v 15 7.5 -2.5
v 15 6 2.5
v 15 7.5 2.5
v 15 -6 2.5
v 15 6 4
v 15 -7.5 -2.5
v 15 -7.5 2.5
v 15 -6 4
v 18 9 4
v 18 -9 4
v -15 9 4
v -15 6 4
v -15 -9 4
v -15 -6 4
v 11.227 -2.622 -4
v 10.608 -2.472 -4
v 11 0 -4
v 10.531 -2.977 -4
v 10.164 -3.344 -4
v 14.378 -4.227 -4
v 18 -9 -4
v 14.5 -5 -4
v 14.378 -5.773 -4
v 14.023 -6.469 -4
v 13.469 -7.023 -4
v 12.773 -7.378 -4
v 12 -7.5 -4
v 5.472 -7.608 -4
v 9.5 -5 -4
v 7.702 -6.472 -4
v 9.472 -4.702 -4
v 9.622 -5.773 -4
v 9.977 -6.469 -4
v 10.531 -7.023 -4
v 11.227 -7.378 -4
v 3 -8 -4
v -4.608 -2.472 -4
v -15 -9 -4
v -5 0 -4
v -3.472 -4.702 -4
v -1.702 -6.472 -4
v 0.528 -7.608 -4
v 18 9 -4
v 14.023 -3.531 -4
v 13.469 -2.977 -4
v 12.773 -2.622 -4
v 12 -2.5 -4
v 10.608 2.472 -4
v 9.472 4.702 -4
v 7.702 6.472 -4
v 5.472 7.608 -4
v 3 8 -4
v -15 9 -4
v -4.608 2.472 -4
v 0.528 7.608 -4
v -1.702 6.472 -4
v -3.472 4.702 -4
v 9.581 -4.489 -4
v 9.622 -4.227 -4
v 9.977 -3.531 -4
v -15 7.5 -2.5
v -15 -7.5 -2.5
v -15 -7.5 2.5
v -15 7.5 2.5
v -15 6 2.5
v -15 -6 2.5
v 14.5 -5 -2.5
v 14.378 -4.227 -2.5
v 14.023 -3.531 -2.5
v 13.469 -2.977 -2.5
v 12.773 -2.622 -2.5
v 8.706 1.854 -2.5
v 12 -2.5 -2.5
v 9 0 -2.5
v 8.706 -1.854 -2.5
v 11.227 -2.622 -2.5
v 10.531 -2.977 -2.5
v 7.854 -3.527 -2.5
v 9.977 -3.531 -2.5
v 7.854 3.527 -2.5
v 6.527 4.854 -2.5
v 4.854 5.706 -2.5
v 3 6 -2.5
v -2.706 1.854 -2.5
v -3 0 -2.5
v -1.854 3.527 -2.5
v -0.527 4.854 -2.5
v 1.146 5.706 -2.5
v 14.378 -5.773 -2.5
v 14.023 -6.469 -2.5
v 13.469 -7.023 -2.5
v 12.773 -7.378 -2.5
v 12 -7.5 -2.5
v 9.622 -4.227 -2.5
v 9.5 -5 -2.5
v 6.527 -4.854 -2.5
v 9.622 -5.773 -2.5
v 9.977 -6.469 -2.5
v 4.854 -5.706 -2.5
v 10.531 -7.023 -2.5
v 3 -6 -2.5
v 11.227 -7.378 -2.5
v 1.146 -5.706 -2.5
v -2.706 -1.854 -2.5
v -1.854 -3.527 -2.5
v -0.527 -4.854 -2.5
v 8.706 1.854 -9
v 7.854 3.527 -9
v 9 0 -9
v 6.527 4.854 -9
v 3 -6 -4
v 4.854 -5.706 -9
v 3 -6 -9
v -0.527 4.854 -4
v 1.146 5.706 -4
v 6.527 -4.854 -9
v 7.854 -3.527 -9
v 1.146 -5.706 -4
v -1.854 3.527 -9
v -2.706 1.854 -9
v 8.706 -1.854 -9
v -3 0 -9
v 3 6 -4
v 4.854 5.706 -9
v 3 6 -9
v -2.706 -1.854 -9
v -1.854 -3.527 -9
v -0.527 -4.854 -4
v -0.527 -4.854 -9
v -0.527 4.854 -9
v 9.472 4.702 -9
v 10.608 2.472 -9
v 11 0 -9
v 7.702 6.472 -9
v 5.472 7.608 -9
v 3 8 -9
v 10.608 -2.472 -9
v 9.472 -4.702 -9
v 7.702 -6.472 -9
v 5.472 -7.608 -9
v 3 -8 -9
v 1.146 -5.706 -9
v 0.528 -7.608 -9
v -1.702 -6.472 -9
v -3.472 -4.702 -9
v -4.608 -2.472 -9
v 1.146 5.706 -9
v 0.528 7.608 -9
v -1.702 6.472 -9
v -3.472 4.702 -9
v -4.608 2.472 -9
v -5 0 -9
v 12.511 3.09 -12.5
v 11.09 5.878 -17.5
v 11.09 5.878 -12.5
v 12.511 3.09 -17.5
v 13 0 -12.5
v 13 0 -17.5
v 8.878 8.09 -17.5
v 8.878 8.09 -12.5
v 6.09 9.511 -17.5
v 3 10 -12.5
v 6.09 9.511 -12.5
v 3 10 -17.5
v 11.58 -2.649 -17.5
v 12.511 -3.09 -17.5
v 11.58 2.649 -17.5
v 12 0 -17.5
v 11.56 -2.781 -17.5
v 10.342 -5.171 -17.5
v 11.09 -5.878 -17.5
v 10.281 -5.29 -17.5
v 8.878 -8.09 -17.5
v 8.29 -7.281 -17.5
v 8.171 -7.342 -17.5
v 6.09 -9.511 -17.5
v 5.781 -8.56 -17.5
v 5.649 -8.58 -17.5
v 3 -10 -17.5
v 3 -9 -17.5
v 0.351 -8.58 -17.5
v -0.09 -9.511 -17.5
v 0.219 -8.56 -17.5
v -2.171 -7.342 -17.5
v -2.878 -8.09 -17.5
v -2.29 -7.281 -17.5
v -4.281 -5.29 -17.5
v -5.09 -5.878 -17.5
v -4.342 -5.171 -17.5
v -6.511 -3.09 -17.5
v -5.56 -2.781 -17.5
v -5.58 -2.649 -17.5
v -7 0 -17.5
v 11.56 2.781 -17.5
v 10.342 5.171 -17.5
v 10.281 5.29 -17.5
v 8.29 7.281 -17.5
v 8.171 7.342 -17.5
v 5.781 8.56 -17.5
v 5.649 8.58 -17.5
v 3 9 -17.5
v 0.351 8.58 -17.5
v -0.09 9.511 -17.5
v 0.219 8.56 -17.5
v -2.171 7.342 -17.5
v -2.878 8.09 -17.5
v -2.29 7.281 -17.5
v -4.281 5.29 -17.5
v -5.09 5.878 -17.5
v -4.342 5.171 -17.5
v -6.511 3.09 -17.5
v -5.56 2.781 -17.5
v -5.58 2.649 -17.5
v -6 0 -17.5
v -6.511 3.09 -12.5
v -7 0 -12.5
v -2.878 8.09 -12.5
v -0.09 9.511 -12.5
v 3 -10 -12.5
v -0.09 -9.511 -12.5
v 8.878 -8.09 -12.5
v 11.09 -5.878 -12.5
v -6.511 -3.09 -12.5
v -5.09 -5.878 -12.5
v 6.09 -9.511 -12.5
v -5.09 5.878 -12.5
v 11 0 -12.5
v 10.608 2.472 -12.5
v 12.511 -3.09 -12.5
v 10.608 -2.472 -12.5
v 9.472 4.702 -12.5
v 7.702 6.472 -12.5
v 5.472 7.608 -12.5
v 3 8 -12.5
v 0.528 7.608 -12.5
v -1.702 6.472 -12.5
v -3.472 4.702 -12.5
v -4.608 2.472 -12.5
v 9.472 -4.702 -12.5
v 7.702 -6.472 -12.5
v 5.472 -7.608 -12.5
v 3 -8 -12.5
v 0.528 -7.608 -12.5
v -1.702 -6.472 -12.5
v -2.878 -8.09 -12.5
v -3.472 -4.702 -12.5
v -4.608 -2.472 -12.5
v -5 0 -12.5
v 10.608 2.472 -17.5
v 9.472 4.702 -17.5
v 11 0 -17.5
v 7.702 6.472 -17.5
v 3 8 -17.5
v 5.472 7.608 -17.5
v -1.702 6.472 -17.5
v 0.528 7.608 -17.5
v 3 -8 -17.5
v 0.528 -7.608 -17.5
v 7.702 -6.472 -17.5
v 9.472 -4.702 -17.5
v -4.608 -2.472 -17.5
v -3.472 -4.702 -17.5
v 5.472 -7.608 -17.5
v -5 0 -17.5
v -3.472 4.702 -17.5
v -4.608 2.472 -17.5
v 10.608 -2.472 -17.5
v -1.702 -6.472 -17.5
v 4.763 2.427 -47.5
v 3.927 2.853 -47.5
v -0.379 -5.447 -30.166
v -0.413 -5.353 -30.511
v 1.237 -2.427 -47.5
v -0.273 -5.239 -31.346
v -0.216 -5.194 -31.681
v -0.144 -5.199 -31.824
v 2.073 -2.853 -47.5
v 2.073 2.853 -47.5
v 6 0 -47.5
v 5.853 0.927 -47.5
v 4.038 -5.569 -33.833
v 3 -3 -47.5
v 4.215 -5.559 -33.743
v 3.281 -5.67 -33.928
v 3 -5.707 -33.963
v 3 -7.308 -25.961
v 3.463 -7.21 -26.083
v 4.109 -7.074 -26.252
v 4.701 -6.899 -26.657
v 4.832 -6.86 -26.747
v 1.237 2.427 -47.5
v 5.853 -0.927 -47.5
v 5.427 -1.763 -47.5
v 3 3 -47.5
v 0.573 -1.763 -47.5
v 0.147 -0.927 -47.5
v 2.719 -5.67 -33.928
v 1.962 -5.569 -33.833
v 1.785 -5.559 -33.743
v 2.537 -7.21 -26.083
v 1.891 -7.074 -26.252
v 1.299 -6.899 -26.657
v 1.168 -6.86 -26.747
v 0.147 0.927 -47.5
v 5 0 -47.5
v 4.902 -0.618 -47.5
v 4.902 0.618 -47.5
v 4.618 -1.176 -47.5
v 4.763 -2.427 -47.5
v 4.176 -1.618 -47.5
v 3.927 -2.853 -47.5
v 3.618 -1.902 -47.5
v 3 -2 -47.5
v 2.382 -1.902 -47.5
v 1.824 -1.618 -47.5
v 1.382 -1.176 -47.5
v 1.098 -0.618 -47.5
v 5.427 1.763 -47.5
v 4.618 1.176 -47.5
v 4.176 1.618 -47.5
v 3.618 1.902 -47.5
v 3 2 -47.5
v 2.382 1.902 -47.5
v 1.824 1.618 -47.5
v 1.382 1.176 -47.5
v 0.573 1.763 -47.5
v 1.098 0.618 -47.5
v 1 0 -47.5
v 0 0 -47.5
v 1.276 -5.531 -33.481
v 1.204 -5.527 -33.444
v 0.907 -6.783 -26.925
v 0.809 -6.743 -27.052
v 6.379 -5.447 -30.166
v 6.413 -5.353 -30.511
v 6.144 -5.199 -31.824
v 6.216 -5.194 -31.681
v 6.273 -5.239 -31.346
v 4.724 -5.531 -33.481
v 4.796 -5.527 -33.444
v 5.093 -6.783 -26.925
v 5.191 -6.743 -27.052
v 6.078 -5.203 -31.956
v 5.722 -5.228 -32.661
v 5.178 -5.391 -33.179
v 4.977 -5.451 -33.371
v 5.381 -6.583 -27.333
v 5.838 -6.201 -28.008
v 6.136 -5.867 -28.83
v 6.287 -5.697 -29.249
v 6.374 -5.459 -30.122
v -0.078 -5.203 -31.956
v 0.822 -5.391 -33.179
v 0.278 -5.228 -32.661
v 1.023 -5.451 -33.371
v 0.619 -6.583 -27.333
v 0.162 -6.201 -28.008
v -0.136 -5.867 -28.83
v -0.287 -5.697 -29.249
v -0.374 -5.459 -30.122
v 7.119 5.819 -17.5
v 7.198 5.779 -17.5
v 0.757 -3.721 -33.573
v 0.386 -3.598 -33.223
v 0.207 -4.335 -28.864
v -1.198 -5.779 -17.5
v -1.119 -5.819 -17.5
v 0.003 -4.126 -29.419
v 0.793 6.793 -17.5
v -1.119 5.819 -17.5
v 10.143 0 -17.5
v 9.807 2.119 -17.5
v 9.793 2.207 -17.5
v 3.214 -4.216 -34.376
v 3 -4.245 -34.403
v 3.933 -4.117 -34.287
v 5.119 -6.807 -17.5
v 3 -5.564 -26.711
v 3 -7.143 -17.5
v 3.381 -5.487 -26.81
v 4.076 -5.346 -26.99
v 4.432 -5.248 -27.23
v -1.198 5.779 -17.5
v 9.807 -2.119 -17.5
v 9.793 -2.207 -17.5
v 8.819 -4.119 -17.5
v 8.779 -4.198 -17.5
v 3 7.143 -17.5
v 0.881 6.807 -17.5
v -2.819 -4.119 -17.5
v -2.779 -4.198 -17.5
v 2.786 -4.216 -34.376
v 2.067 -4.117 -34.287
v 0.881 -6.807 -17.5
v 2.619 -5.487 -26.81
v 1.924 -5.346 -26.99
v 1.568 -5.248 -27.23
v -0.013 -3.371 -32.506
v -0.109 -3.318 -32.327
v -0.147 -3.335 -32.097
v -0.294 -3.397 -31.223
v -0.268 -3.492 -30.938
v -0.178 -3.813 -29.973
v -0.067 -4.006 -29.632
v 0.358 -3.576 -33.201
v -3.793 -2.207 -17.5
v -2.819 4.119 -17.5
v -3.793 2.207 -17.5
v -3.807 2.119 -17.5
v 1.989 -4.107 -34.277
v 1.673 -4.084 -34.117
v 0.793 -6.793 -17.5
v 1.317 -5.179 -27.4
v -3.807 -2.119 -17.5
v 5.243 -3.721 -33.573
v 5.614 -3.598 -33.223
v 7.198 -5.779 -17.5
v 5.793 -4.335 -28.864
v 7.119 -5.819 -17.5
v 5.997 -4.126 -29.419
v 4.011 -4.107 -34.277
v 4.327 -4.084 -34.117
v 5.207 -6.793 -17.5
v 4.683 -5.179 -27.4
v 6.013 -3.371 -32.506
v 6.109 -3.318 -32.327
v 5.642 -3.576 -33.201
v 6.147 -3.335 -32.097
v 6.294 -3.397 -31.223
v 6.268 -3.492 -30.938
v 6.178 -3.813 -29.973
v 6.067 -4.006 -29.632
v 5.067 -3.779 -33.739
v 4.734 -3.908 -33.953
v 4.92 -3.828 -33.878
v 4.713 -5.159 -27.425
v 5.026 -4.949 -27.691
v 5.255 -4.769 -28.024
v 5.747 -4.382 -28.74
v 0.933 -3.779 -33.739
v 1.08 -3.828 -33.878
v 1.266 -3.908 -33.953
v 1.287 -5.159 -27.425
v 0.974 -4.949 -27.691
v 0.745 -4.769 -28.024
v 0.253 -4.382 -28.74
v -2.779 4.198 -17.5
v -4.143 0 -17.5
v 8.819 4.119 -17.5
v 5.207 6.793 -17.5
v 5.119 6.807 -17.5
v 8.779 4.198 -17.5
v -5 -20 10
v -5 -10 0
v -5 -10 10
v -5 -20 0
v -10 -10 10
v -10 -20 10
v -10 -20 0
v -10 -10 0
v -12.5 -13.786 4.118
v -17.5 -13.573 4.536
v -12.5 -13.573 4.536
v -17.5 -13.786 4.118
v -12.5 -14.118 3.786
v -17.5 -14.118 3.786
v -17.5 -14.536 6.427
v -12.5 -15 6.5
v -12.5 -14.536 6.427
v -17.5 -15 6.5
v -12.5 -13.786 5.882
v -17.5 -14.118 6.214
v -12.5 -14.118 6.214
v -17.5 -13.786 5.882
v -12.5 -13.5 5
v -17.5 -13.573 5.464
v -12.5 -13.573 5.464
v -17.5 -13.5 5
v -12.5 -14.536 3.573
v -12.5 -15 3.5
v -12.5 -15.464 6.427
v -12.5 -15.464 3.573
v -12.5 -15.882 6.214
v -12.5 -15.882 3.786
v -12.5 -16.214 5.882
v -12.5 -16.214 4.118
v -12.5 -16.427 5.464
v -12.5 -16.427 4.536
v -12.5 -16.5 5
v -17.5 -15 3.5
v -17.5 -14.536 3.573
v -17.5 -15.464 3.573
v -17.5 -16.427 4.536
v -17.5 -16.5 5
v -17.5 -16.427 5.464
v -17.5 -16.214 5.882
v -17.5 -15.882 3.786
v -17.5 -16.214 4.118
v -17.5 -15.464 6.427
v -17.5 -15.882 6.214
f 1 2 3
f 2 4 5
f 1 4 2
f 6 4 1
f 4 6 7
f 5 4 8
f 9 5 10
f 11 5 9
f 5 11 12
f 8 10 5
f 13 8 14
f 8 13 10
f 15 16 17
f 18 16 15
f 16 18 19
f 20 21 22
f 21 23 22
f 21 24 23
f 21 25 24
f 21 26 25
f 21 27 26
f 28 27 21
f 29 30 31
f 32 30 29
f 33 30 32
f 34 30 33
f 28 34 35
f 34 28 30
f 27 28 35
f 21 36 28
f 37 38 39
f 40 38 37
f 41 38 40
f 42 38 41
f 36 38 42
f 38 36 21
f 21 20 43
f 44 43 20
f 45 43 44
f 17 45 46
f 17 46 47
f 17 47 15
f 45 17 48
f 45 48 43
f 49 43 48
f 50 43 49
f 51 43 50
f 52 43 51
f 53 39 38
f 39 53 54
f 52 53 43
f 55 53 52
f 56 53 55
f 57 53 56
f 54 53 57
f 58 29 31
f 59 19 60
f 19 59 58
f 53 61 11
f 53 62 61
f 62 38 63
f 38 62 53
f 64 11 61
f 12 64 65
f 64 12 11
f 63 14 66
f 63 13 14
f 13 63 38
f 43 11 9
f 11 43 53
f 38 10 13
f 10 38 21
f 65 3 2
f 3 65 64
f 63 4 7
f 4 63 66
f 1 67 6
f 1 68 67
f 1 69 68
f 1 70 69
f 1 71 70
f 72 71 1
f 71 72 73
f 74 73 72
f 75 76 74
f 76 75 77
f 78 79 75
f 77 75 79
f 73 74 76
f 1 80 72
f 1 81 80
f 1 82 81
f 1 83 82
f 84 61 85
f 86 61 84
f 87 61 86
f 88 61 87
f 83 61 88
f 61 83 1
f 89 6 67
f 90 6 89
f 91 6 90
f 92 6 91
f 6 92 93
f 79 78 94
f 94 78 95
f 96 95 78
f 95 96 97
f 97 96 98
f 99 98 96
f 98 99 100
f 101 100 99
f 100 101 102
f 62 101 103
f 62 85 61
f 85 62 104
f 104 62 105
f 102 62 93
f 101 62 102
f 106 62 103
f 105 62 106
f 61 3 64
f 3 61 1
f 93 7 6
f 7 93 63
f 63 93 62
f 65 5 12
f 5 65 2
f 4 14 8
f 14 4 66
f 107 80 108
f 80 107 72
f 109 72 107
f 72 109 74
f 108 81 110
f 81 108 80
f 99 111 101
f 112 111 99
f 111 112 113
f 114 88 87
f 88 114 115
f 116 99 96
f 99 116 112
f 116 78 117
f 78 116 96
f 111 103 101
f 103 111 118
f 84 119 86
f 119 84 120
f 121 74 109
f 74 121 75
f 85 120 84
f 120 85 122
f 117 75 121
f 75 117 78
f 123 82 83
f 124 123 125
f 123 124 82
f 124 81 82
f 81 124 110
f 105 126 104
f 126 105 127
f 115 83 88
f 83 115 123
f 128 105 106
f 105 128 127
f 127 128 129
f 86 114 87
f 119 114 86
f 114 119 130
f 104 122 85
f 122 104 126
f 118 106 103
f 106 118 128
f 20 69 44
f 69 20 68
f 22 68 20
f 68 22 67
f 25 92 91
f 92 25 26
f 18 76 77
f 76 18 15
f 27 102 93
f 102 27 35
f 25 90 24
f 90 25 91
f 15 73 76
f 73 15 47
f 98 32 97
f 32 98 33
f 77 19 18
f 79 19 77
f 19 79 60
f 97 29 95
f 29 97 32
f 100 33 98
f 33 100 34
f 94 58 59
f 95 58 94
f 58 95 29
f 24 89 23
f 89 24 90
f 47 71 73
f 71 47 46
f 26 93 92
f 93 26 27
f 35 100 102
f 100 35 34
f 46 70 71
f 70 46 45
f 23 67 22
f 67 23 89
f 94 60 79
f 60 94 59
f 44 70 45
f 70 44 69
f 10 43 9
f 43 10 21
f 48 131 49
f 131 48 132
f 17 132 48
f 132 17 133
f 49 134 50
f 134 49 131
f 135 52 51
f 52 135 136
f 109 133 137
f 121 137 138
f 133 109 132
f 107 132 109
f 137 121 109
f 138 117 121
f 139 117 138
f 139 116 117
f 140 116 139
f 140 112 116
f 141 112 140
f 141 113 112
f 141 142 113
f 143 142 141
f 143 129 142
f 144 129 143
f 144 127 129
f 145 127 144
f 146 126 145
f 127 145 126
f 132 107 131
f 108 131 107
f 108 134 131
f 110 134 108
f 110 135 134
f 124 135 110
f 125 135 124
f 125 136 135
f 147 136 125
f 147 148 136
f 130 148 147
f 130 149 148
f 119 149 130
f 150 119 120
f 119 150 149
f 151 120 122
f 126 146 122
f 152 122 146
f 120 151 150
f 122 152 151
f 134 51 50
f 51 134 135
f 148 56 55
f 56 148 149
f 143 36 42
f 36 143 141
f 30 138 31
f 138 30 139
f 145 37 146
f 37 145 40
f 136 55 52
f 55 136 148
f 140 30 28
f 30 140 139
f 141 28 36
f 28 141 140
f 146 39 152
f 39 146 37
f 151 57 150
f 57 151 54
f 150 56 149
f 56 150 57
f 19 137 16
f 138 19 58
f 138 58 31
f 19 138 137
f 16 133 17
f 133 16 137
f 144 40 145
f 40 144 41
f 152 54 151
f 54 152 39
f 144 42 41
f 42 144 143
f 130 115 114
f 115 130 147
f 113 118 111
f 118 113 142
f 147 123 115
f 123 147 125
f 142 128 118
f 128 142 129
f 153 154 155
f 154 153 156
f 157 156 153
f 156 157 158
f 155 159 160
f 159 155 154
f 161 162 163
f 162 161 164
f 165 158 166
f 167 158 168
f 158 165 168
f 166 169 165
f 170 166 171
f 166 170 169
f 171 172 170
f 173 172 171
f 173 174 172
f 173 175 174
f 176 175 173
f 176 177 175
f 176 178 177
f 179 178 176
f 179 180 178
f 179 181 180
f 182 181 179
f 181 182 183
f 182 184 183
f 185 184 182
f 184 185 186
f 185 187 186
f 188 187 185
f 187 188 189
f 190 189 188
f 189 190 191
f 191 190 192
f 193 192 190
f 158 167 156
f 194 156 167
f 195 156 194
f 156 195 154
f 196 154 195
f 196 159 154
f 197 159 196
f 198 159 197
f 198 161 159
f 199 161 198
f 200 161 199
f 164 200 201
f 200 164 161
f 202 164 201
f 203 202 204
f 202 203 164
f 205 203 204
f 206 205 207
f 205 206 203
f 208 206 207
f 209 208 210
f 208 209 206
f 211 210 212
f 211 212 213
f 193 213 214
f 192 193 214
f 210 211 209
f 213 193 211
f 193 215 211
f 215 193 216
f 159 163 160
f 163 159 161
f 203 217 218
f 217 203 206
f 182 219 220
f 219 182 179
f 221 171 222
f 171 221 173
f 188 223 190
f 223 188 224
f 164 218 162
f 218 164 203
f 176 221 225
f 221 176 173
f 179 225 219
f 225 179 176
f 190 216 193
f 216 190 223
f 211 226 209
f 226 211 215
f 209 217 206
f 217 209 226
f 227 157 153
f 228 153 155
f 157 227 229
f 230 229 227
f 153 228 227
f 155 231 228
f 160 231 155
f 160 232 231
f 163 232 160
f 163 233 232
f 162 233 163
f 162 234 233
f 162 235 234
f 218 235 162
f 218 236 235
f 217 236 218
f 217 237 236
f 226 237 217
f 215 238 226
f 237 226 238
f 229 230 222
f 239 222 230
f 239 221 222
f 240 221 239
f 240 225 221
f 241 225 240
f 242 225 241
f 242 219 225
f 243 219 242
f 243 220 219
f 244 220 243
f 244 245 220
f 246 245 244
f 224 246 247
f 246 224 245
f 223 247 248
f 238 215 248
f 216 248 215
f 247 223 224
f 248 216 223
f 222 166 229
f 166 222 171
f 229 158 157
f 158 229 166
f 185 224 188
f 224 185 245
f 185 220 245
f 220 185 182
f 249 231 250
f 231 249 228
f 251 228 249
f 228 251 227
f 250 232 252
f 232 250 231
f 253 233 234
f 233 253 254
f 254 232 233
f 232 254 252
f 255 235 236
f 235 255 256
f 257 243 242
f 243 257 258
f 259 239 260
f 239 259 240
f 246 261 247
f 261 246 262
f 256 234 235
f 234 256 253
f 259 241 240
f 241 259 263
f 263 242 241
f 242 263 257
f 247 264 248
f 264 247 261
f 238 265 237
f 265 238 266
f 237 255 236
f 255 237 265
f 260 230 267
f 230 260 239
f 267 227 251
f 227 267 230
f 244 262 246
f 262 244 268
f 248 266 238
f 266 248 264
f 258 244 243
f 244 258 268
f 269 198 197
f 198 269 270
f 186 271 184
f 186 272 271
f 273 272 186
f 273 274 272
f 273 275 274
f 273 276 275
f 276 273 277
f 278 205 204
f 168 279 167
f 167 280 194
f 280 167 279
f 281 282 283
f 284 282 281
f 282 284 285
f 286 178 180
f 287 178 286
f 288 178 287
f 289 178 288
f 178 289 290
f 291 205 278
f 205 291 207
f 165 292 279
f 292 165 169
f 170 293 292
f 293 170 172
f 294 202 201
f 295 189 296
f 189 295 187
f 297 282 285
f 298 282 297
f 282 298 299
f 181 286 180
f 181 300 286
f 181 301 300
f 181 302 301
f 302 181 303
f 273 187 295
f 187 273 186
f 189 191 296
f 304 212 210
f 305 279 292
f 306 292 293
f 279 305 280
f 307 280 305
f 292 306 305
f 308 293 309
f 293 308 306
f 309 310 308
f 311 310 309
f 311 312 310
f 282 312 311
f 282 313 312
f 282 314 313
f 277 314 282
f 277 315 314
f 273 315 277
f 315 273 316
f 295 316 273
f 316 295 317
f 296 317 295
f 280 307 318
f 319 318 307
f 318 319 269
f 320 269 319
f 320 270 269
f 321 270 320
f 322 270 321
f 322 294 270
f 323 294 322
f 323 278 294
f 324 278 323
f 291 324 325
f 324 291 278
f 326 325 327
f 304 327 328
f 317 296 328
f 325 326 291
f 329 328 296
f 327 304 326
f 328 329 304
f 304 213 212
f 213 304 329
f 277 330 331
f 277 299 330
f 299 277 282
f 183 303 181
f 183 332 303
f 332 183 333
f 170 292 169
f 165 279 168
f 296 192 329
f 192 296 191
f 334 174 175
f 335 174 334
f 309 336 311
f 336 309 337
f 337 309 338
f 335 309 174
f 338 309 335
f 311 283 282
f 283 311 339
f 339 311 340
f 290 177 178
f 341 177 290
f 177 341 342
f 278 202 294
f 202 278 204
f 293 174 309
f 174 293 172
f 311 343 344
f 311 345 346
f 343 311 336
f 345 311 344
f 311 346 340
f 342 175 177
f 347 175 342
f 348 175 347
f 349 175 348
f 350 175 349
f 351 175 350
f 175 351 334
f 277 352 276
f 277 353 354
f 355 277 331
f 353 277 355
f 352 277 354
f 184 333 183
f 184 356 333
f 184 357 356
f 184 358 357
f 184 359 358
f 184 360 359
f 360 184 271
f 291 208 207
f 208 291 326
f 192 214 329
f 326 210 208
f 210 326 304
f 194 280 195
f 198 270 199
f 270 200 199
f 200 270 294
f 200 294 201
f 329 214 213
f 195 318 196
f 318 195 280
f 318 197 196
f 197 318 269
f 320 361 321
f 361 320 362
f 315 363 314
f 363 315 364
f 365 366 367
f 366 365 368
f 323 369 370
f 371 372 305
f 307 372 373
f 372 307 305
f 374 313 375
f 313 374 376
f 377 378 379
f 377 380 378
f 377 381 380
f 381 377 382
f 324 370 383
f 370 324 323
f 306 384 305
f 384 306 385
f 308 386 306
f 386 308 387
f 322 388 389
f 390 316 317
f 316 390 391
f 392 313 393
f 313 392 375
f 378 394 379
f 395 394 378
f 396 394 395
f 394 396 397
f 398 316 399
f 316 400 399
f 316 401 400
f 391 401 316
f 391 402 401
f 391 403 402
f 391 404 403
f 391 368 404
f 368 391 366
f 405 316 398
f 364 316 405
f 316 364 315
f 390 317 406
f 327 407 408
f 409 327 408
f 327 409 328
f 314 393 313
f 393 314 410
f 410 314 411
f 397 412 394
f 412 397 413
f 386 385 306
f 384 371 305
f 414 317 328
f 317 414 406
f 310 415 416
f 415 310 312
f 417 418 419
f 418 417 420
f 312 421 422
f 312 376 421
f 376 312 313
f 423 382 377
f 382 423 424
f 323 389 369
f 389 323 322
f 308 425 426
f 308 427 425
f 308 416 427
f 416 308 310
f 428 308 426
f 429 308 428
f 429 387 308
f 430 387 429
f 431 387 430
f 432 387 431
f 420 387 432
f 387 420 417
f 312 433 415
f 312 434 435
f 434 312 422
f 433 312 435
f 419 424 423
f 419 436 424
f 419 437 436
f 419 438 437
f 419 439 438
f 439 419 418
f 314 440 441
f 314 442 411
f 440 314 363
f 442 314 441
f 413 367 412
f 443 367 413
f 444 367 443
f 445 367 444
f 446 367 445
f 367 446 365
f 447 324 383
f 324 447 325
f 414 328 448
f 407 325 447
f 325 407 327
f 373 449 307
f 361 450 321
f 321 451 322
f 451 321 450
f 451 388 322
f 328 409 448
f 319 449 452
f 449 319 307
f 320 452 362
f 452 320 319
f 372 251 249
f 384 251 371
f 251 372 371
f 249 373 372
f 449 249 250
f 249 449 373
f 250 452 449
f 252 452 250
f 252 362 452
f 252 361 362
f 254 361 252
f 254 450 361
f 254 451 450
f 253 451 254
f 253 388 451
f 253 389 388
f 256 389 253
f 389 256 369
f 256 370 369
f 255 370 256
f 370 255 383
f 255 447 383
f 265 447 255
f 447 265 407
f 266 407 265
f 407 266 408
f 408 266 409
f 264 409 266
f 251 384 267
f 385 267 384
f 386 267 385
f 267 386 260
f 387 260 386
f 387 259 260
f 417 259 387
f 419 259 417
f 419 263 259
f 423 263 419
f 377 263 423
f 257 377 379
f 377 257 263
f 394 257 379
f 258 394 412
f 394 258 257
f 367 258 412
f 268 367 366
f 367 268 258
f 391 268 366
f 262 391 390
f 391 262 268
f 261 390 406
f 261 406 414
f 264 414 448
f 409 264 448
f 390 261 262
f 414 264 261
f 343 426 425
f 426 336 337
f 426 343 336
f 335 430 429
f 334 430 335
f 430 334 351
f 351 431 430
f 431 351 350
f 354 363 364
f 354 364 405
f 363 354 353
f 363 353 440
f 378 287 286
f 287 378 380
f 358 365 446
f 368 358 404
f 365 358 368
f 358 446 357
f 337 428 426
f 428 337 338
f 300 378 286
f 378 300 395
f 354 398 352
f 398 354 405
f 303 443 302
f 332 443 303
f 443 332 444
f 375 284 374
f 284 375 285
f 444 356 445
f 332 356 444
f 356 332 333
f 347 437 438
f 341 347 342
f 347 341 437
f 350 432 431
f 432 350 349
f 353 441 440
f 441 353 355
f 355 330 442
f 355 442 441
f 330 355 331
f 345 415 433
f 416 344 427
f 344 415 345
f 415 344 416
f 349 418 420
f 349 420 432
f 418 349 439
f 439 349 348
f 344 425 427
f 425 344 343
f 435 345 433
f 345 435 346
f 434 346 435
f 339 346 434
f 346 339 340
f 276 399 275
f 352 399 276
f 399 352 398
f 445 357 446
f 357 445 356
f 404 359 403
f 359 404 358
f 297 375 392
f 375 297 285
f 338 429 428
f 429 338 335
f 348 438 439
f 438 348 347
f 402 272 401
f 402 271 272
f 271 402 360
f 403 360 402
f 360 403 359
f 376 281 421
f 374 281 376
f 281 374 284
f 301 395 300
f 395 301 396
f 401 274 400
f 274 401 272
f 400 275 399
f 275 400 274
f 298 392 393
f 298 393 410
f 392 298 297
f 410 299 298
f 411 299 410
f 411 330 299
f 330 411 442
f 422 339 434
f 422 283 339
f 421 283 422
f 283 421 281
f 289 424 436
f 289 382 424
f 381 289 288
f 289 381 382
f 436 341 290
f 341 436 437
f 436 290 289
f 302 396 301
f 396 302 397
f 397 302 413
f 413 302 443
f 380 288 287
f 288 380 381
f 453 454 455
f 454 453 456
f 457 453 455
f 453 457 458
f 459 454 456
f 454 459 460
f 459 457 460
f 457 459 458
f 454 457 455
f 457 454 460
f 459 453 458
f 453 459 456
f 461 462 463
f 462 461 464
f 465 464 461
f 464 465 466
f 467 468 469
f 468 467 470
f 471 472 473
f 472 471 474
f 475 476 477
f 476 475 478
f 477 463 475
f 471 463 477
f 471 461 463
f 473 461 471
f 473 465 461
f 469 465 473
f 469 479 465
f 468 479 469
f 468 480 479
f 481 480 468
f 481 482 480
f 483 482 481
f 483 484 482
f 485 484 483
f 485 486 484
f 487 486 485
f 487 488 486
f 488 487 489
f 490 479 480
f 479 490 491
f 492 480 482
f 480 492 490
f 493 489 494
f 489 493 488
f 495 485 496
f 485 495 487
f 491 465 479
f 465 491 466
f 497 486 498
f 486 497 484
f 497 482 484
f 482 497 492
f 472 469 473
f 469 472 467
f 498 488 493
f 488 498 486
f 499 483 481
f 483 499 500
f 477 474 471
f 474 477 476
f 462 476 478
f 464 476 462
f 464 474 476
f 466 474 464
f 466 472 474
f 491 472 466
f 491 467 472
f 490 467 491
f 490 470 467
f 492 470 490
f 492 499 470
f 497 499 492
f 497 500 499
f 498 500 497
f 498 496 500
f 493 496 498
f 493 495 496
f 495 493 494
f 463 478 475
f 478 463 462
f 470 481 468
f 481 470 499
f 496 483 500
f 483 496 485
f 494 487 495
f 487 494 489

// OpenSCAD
$fn = 20;
// fn - параметр детализации. для быстрого рендеринга - 20
// для печати - 60-80


// все детали в модулях печатаются отдельно и склеиваются клеем
module base(){
// основное крепление
  size_x = 30;
  size_y = 15;
  size_z = 5;
  shell = 3;

  difference(){
    cube([size_x,size_y+shell,size_z+ shell], center=true);
  	cube([size_x,size_y,size_z],center=true);
  	translate([0,0,shell]){
  		cube([size_x,size_y-shell,size_z],center=true);
  	}
  	translate([3, 0,0]){
  		cylinder(r=6,h=30, center = true);
  	}
  	translate([12,-5,-15]){
  		cylinder(r=2.5,h=30, center = true);
  	}
  }
  translate([size_x/2+shell/2,0,0]){
  	cube([shell,size_y+shell,size_z+ shell], center=true);
  }
}

module clutch() {
// муфта для крепления обдувающего конуса
// клеится на корпус клеем, конус надевается вплотную
color("red"){
    difference(){
        cylinder(r=8,h=5, center = true);
        cylinder(r=6,h=5, center = true);
    }
  }
}

module nozzle35mm(){
// обдувающий носик, надевается на муфту
// высота - 35мм
  union() {
    color("blue"){
      translate([0,0,30/2]){
        difference(){
          cylinder(r=10,h=5, center = true);
          cylinder(r=8,h=5, center = true);
        }
      }
    }
    color("lime"){
      difference(){
        cylinder(r2=10, r1=3, h = 35,center = true);
        cylinder(r2=8,  r1=2, h = 35,center = true);
        translate([0,0,30/2]){
          cylinder(r=8,h=5, center = true);
        }
        pen(solid=1);
      }
    }
  }
}
module nozzle45mm(){
// обдувающий носик, надевается на муфту
// высота - 35мм
  union() {
    color("blue"){
      translate([0,0,20]){
        difference(){
          cylinder(r=10,h=5, center = true);
          cylinder(r=8,h=5, center = true);
        }
      }
    }
    color("lime"){
      difference(){
        cylinder(r2=10, r1=3, h = 45,center = true);
        cylinder(r2=8,  r1=2, h = 45,center = true);
        translate([0,0,20]){
          cylinder(r=8,h=5, center = true);
        }
        pen(solid=1);
      }
    }
  }
}
module pen(solid = 0) {
  if(solid==1){
    translate([0,-30/2, 3]){
      rotate([70, 0, 0]) {
        cylinder(r2=5, r1=3, h = 35,center = true);
      }
    }
  }
  if(solid!=1){
    translate([0,-30/2, 3]){
      rotate([70, 0, 0]) {
        difference() {
          cylinder(r2=5, r1=3, h = 35,center = true);
          cylinder(r2=3,  r1=2, h = 35,center = true);
        }
      }
    }
  }
// конический вход для трубки обдува
// втыкается сбоку в обдувающий носик

}
module add_pin() {
// штифт для дополнительной фиксации корпуса
// и крепление к нему
// штифт и крепление сажаются на клей
  translate([-10, -20, 0]) {
    cube([5,10,10]);
  }
  translate([-15, -15, 5]) {
    rotate([0,90,0]){
      cylinder(r=1.5, h=5, center=true);
    }
  }
}
////////////////////////////////////////////
base();
translate([3,0,-6.5]){
  clutch();
}
translate([3,0,-30]){
  nozzle35mm();
  //pen();
}

color("cyan"){
 add_pin();
}
